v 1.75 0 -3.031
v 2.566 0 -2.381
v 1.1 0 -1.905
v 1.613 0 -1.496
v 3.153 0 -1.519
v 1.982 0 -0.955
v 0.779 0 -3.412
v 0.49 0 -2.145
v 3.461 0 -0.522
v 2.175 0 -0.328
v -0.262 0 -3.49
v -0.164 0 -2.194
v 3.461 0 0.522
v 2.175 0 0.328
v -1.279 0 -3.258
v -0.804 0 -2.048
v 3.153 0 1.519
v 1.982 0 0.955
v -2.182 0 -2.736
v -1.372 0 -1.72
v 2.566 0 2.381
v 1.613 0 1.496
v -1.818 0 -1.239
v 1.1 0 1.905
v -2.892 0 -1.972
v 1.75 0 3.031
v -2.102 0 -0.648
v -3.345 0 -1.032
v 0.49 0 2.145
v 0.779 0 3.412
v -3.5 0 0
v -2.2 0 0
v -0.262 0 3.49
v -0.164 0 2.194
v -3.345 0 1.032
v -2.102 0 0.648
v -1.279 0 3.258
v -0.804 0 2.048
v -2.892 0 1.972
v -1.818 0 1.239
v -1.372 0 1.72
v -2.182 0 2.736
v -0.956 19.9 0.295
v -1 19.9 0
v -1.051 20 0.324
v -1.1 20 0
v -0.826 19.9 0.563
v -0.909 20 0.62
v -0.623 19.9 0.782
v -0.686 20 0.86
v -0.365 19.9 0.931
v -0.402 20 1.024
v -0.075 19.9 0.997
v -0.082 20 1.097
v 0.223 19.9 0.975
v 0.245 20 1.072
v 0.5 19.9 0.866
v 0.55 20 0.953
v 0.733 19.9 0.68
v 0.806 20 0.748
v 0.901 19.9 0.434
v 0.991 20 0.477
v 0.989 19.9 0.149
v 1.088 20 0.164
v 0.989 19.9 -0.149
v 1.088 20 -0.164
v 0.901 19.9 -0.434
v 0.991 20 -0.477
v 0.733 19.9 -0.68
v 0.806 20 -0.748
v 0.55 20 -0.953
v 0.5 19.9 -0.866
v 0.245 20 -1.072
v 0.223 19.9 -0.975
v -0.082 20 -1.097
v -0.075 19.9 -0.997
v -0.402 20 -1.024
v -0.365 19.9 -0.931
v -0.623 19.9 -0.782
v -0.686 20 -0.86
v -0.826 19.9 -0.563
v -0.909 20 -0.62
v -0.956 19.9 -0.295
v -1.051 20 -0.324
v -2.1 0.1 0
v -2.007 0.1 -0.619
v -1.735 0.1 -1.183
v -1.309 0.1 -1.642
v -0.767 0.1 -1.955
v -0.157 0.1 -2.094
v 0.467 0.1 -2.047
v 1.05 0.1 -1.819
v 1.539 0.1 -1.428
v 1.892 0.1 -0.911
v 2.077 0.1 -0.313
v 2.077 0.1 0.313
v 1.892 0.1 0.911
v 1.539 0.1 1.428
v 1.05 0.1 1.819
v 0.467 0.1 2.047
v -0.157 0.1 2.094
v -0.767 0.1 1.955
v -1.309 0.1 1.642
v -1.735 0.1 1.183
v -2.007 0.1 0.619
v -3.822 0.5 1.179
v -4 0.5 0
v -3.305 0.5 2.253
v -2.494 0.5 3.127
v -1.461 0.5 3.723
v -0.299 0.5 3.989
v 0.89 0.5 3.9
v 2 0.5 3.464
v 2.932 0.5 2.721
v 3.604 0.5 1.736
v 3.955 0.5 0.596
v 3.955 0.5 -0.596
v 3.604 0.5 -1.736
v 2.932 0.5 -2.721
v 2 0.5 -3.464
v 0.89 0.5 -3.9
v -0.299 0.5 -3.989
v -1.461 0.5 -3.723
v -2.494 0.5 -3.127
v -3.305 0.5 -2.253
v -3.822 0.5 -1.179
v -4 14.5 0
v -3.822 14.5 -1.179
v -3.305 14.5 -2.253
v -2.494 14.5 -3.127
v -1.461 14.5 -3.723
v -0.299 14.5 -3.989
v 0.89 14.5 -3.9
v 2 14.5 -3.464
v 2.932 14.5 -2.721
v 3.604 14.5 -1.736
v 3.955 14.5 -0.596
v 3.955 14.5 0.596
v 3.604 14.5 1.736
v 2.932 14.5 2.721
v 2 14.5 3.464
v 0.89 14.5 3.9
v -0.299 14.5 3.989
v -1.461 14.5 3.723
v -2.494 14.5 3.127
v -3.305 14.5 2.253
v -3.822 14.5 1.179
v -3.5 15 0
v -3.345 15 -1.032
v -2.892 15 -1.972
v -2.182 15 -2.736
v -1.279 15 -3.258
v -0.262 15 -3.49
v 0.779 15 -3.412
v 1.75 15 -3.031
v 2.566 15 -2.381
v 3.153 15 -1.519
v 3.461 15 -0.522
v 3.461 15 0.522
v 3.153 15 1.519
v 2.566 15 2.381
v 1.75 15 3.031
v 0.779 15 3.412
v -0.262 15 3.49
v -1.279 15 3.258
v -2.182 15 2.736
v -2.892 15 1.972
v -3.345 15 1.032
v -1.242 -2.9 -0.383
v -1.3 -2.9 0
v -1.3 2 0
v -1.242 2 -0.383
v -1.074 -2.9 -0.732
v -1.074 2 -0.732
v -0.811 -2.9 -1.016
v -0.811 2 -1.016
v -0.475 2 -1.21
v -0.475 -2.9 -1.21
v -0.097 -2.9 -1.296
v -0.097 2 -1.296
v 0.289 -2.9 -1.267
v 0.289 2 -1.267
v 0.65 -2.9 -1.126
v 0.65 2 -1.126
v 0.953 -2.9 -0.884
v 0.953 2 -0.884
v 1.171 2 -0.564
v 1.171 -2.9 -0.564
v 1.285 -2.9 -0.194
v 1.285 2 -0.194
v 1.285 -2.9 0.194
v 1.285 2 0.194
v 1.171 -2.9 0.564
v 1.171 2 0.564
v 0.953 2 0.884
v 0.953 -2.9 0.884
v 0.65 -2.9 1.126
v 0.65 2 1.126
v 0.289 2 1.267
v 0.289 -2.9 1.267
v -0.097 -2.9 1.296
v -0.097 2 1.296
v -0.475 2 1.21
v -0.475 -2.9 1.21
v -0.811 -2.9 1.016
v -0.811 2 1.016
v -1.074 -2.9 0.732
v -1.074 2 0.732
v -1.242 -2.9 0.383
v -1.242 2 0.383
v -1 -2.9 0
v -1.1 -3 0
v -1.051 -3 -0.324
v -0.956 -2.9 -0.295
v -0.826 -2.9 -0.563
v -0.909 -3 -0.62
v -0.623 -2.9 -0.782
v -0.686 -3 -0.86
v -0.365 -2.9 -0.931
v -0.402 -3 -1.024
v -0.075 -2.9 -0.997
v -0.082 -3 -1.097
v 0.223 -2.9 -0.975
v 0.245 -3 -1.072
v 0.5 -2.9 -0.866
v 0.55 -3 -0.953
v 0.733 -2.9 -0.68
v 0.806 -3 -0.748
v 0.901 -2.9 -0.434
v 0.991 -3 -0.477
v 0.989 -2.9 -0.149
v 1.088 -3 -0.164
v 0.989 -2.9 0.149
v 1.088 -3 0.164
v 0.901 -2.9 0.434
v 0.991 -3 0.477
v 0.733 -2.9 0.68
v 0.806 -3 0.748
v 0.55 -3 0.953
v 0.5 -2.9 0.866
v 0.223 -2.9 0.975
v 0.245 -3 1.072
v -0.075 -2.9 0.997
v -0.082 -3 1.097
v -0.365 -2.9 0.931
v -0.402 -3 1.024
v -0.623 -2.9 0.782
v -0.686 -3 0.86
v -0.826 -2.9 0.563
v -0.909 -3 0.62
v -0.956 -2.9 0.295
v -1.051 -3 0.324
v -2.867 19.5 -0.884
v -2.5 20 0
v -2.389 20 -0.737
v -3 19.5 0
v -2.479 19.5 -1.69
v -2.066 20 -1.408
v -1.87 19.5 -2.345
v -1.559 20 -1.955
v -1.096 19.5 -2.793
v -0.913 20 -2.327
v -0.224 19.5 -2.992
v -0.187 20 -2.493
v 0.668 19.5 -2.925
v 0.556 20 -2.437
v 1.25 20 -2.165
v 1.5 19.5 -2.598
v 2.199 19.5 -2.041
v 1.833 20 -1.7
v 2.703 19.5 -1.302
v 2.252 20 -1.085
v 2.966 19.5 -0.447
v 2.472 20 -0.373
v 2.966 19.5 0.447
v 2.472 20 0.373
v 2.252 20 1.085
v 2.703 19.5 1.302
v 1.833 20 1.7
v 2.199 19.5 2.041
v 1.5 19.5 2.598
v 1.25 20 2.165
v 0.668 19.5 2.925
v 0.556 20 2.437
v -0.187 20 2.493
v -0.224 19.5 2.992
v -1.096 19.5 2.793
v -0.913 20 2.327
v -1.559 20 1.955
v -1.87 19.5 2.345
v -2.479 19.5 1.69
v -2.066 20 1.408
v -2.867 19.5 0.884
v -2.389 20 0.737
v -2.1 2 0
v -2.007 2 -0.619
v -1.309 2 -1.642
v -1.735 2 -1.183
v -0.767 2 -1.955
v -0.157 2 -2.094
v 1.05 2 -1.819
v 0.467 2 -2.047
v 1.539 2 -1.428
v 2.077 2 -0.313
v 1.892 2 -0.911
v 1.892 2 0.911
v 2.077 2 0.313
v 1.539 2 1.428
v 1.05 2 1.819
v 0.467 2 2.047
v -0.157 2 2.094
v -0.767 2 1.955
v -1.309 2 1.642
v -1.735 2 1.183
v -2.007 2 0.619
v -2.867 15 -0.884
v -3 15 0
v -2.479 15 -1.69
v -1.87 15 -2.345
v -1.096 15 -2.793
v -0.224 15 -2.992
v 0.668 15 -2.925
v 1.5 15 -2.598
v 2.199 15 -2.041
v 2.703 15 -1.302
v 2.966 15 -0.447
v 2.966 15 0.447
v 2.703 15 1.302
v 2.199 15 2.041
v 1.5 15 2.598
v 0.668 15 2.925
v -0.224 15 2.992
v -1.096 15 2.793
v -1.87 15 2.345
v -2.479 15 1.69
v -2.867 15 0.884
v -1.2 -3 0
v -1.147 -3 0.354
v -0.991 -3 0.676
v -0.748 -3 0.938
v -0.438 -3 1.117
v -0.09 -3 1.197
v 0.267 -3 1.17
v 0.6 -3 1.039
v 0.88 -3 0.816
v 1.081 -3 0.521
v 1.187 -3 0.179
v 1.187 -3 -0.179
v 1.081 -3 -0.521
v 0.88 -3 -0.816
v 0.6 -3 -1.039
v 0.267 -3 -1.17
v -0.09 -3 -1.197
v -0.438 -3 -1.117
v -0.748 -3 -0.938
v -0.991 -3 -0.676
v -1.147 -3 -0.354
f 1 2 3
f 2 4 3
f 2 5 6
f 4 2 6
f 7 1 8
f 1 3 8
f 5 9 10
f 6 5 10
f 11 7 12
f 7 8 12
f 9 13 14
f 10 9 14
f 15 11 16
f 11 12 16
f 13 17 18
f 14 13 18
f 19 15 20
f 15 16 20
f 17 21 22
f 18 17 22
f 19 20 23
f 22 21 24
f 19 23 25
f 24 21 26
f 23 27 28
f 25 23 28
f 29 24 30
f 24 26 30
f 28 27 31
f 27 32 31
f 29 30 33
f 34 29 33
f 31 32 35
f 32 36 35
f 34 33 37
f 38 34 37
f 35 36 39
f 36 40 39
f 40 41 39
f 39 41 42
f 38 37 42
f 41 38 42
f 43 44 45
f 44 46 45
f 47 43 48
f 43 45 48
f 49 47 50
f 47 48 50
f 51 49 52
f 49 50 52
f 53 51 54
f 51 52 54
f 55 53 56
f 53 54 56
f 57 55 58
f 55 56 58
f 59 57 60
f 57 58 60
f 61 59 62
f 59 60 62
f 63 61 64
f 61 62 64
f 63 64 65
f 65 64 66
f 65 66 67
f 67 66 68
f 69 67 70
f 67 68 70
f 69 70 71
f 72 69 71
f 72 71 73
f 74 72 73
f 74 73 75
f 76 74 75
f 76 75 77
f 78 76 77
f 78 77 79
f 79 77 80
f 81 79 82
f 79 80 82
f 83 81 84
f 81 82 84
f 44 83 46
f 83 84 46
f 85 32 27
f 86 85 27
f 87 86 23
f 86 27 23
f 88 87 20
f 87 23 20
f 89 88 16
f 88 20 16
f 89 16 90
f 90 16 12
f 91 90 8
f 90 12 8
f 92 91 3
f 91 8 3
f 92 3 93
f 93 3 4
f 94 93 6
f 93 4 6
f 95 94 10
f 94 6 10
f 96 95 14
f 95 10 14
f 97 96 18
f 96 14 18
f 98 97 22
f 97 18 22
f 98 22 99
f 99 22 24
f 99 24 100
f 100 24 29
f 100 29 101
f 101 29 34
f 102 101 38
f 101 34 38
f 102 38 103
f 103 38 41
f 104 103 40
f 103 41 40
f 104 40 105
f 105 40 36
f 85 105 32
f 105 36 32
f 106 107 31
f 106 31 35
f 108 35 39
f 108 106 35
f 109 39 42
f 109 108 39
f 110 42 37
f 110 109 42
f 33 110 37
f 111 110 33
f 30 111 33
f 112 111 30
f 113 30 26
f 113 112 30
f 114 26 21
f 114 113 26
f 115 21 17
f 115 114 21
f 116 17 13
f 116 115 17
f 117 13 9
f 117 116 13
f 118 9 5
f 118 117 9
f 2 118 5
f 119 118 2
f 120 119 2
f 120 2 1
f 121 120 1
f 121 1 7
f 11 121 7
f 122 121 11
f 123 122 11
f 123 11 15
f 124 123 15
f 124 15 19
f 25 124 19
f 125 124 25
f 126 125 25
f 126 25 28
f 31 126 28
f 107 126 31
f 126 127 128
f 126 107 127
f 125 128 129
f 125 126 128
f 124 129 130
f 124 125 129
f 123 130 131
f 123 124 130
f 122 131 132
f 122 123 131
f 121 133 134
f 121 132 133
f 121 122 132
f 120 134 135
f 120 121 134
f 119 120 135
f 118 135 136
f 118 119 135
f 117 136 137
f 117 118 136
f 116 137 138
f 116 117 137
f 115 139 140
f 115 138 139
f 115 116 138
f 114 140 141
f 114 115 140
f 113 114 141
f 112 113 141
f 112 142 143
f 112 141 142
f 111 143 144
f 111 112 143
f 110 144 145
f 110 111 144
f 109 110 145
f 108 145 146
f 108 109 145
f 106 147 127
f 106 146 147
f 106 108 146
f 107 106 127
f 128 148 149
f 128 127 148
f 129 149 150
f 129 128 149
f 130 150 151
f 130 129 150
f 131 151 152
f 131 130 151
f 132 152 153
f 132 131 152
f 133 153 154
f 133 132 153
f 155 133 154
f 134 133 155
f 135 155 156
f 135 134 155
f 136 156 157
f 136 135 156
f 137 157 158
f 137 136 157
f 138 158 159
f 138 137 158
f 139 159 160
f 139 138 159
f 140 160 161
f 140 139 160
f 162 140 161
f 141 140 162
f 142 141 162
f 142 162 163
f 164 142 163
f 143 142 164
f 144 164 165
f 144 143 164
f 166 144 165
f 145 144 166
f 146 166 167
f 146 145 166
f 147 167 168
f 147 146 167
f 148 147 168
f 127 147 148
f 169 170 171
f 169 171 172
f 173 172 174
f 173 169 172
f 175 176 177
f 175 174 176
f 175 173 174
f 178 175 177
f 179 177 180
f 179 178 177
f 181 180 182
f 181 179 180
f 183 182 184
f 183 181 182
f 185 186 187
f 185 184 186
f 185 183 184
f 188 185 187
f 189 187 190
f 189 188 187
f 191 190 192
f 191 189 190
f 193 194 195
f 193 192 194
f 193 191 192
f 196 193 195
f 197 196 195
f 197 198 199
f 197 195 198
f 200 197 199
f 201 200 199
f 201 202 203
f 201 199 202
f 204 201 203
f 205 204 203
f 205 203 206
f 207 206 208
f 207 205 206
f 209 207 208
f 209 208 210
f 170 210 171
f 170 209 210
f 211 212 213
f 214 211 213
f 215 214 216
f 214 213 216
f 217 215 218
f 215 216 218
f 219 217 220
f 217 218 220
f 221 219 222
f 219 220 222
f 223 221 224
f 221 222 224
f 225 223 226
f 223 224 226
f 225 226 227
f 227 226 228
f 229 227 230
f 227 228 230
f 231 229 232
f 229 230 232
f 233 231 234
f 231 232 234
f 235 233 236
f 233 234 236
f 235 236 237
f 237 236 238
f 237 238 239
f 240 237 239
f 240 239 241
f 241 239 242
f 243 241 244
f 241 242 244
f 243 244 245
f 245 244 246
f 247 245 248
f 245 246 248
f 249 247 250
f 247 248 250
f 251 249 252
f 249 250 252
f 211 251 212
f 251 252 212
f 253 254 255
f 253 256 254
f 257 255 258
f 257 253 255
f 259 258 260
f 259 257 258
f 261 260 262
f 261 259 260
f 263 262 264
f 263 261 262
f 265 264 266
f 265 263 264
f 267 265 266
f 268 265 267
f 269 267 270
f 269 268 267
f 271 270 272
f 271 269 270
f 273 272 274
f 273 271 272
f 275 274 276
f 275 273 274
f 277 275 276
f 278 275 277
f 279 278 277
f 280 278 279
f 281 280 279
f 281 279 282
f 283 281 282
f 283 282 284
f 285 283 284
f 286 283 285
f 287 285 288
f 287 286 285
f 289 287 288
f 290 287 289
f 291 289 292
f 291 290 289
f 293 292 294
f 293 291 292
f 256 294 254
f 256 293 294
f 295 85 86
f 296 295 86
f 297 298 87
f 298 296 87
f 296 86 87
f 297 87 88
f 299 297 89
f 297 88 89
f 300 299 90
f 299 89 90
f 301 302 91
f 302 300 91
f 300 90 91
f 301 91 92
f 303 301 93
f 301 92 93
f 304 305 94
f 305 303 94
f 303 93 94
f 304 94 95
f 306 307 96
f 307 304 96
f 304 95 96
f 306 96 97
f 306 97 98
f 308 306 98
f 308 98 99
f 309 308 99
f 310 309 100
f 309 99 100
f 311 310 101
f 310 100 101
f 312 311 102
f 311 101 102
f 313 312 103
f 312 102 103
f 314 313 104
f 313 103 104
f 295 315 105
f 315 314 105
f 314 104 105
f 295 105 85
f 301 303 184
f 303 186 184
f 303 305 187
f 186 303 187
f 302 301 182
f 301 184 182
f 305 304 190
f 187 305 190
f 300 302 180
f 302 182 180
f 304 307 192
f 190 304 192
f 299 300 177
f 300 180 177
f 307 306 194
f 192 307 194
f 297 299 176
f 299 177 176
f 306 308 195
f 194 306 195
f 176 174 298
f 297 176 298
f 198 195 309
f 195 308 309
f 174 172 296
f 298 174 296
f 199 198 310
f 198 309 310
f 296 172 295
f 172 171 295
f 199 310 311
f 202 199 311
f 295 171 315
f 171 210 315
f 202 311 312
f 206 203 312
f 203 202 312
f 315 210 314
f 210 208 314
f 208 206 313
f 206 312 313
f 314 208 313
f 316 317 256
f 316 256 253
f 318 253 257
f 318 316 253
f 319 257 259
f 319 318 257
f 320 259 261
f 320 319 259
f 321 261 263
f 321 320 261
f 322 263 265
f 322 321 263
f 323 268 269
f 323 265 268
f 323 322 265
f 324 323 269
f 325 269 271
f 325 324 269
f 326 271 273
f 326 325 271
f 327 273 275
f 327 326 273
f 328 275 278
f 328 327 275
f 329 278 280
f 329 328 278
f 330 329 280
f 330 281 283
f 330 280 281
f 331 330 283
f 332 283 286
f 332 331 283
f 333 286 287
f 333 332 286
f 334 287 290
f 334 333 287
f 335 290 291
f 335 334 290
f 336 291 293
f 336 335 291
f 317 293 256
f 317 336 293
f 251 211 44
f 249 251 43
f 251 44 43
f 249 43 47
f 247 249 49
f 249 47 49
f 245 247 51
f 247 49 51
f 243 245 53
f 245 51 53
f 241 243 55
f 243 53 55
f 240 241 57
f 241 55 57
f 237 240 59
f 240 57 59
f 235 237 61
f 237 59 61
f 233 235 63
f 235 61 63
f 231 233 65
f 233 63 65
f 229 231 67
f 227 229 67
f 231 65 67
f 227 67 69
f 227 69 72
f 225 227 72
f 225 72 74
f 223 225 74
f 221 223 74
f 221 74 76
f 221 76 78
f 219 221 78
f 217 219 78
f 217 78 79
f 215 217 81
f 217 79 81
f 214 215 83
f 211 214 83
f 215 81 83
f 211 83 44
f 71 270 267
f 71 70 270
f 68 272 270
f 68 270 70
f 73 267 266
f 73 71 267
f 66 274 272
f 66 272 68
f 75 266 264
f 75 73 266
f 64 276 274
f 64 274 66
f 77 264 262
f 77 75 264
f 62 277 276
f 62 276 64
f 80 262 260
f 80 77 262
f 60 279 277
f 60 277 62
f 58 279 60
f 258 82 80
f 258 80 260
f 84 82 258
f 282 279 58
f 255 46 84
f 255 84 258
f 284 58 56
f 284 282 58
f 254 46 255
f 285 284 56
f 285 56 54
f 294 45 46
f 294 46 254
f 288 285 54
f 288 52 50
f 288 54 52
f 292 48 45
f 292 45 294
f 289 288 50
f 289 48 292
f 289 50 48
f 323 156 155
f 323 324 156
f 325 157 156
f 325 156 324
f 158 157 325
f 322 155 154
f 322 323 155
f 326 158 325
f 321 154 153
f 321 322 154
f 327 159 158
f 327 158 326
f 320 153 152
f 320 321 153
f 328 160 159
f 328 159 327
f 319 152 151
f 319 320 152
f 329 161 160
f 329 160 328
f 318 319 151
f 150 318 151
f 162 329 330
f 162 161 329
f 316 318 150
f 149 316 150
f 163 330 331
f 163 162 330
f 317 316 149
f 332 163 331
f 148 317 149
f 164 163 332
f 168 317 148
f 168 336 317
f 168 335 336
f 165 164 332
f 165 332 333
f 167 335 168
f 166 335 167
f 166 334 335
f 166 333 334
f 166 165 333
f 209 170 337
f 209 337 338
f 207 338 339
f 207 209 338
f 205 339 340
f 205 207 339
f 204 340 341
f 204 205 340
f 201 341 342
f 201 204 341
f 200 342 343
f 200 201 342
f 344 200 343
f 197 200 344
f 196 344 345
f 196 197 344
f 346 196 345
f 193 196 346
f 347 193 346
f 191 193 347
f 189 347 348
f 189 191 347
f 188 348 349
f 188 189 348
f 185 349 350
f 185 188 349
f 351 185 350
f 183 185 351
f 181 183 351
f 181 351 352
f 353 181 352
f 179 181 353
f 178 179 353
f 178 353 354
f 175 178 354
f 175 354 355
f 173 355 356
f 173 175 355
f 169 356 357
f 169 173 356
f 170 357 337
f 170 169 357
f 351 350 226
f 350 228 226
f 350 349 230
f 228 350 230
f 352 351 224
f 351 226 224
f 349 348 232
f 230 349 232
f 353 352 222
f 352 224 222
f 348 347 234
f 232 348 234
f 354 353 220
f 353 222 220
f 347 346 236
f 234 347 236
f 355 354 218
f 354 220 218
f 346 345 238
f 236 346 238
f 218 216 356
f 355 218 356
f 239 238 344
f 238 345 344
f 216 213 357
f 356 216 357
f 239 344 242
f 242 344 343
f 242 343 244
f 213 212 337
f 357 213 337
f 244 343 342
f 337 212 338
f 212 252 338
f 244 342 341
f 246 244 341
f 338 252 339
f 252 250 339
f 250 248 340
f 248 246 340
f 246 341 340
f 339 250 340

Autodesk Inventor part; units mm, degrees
ref_plane "YZ Plane" through (0, 0, 0) normal (1, 0, 0) x (0, 1, 0)
ref_plane "XZ Plane" through (0, 0, 0) normal (0, 1, 0) x (-1, 0, 0)
ref_plane "XY Plane" through (0, 0, 0) normal (0, 0, 1) x (1, 0, 0)
sketch "Sketch1" plane through (0, 0, 0) normal (0, 0, 1) x (1, 0, 0)
  line L0 (-3, 20) -> (-3, 15)
  line L1 (-3, 15) -> (-4, 15)
  line L2 (-4, 15) -> (-4, 0)
  line L3 (-1.3, 2) -> (-1.3, -3)
  line L4 (-1.3, -3) -> (-1, -3)
  line L5 (-1, -3) -> (-1, 20)
  line L6 (-1, 20) -> (-3, 20)
  line L7 (-1.3, 2) -> (-2.1, 2)
  line L8 (-2.1, 2) -> (-2.1, 0)
  line L9 (-2.1, 0) -> (-4, 0)
  line L10 (0, -7.6) -> (0, 24.6) projected
  point P0 (0, 0)
  dimension "d0" = 1
  dimension "d1" = 1.3
  dimension "d3" = 15
  dimension "d4" = 2
  dimension "d5" = 5
  dimension "d6" = 4
  dimension "d7" = 0.8
  dimension "d8" = 2
  dimension "d9" = 5
revolve "Revolution1" add sketch "Sketch1" angle 360 about axis through (0, -10, 0) along (0, 1, 0)
chamfer "Chamfer1" distance 0.5 angle 45 3 edges at (4, 15, 0) (3, 20, 0) (4, 0, 0)
chamfer "Chamfer2" distance 0.1 angle 45 4 edges at (2.1, 0, 0) (1.3, -3, 0) (1, -3, 0) (1, 20, 0)
properties part number "EPR Capillary Glue Ferrule"
